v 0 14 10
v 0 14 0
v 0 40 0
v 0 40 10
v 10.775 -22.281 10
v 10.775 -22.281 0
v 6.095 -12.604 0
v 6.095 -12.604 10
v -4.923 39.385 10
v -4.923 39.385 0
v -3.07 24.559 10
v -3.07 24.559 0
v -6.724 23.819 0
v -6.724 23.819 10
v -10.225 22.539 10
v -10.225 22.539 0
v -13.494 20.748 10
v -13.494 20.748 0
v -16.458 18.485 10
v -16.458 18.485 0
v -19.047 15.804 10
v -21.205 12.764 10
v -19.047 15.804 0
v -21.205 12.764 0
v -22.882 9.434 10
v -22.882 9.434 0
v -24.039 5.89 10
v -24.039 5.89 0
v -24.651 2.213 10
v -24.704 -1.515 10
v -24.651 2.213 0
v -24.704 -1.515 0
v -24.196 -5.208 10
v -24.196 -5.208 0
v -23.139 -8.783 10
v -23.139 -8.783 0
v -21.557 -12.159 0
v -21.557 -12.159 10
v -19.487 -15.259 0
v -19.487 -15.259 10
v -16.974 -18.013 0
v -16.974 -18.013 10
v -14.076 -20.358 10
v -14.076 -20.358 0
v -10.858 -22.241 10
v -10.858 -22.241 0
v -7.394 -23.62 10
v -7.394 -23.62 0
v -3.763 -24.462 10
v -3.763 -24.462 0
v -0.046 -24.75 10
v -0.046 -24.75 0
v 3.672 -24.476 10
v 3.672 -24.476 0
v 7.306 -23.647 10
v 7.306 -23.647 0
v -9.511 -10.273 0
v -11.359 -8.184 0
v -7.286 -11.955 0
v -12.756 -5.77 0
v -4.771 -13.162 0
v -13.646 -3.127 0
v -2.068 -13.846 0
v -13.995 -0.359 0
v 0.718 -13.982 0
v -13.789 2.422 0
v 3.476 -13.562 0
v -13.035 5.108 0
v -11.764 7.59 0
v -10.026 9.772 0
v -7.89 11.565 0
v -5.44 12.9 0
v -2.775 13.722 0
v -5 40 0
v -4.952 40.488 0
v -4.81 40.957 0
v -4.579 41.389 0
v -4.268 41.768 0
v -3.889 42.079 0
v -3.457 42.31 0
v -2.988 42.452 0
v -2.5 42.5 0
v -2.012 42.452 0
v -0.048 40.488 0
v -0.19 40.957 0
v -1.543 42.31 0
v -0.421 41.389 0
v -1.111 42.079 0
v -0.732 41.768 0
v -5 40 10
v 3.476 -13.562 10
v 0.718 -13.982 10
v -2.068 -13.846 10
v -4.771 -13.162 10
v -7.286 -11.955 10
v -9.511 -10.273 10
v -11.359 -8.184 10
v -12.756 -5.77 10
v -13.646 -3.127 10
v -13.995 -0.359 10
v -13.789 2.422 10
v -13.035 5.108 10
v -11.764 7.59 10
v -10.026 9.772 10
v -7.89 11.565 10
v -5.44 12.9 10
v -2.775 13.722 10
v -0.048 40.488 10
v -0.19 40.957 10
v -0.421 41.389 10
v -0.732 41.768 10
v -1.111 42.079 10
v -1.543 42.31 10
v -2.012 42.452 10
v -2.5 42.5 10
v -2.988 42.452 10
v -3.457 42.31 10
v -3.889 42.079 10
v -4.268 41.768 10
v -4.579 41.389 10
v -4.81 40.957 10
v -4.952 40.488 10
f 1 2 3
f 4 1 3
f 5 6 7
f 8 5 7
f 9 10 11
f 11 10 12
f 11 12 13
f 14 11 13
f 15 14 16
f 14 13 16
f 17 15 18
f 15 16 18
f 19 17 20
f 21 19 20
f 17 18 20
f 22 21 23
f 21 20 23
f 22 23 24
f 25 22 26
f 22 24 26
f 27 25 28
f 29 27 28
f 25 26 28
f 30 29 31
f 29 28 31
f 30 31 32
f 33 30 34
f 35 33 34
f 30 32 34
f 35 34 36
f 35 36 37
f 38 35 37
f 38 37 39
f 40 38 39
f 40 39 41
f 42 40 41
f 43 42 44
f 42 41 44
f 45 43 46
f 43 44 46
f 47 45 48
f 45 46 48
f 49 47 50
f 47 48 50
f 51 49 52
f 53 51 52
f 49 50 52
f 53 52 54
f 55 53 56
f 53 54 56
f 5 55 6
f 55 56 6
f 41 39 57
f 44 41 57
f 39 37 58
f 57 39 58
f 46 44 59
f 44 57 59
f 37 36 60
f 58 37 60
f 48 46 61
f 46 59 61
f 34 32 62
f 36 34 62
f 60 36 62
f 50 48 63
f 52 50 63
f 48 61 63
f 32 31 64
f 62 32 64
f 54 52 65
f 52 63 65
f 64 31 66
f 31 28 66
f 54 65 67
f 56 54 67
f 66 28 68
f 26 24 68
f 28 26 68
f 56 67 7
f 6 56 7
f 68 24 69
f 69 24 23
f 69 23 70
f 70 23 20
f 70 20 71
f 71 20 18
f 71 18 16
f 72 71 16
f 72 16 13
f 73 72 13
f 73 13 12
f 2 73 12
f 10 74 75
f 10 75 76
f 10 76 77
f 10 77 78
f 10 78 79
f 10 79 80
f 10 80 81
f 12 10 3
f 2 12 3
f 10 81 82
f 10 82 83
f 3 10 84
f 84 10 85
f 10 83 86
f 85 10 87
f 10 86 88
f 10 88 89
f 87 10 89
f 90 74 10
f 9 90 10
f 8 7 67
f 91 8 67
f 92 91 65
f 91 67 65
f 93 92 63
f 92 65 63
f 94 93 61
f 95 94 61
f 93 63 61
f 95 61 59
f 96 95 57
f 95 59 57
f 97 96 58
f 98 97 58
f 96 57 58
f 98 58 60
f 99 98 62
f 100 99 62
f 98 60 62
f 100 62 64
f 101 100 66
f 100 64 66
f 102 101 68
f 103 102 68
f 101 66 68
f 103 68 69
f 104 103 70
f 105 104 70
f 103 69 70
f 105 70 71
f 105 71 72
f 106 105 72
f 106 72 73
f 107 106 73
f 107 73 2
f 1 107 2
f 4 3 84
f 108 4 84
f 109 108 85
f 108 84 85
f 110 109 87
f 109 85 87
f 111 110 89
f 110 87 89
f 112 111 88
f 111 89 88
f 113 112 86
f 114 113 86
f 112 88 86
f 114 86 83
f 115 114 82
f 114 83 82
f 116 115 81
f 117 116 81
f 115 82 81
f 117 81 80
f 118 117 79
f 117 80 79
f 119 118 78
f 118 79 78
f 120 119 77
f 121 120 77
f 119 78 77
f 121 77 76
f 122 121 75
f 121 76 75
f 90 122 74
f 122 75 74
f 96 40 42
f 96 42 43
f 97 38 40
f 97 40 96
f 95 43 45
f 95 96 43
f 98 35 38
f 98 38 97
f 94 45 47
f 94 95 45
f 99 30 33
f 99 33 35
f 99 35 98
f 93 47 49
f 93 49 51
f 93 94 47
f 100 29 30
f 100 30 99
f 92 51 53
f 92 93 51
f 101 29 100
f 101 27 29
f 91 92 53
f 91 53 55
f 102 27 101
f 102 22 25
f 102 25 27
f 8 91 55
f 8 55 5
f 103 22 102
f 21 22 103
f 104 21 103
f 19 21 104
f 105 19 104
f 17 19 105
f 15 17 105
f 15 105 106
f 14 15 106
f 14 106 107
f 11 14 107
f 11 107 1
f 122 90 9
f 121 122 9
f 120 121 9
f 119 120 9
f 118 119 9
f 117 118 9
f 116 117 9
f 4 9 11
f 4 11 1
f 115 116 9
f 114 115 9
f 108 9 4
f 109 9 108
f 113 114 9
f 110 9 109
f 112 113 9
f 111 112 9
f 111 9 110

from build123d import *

# Parameters (mm, degrees)
RESSALTO_EXTRUS_O1_DEPTH = 10


with BuildPart() as part:
    # Esboço1 → Ressalto-extrusão1 (new body)
    with BuildSketch(Plane.XY):
        with BuildLine():
            Line((0, 14), (0, 20))
            Line((0, 20), (0, 40))
            ThreePointArc((0, 40), (-2.5, 42.5), (-5, 40))
            Line((-5, 40), (-4.923076923, 39.384615385))
            Line((-4.923076923, 39.384615385), (-3.069859681, 24.558877449))
            ThreePointArc((-3.069859681, 24.558877449), (-23.734852986, -7.015643501), (10.775337309, -22.281261317))
            Line((10.775337309, -22.281261317), (6.095140296, -12.603541755))
            ThreePointArc((6.095140296, -12.603541755), (-13.646420494, -3.126532858), (0, 14))
        make_face()
    extrude(amount=RESSALTO_EXTRUS_O1_DEPTH)


solid = part.part
